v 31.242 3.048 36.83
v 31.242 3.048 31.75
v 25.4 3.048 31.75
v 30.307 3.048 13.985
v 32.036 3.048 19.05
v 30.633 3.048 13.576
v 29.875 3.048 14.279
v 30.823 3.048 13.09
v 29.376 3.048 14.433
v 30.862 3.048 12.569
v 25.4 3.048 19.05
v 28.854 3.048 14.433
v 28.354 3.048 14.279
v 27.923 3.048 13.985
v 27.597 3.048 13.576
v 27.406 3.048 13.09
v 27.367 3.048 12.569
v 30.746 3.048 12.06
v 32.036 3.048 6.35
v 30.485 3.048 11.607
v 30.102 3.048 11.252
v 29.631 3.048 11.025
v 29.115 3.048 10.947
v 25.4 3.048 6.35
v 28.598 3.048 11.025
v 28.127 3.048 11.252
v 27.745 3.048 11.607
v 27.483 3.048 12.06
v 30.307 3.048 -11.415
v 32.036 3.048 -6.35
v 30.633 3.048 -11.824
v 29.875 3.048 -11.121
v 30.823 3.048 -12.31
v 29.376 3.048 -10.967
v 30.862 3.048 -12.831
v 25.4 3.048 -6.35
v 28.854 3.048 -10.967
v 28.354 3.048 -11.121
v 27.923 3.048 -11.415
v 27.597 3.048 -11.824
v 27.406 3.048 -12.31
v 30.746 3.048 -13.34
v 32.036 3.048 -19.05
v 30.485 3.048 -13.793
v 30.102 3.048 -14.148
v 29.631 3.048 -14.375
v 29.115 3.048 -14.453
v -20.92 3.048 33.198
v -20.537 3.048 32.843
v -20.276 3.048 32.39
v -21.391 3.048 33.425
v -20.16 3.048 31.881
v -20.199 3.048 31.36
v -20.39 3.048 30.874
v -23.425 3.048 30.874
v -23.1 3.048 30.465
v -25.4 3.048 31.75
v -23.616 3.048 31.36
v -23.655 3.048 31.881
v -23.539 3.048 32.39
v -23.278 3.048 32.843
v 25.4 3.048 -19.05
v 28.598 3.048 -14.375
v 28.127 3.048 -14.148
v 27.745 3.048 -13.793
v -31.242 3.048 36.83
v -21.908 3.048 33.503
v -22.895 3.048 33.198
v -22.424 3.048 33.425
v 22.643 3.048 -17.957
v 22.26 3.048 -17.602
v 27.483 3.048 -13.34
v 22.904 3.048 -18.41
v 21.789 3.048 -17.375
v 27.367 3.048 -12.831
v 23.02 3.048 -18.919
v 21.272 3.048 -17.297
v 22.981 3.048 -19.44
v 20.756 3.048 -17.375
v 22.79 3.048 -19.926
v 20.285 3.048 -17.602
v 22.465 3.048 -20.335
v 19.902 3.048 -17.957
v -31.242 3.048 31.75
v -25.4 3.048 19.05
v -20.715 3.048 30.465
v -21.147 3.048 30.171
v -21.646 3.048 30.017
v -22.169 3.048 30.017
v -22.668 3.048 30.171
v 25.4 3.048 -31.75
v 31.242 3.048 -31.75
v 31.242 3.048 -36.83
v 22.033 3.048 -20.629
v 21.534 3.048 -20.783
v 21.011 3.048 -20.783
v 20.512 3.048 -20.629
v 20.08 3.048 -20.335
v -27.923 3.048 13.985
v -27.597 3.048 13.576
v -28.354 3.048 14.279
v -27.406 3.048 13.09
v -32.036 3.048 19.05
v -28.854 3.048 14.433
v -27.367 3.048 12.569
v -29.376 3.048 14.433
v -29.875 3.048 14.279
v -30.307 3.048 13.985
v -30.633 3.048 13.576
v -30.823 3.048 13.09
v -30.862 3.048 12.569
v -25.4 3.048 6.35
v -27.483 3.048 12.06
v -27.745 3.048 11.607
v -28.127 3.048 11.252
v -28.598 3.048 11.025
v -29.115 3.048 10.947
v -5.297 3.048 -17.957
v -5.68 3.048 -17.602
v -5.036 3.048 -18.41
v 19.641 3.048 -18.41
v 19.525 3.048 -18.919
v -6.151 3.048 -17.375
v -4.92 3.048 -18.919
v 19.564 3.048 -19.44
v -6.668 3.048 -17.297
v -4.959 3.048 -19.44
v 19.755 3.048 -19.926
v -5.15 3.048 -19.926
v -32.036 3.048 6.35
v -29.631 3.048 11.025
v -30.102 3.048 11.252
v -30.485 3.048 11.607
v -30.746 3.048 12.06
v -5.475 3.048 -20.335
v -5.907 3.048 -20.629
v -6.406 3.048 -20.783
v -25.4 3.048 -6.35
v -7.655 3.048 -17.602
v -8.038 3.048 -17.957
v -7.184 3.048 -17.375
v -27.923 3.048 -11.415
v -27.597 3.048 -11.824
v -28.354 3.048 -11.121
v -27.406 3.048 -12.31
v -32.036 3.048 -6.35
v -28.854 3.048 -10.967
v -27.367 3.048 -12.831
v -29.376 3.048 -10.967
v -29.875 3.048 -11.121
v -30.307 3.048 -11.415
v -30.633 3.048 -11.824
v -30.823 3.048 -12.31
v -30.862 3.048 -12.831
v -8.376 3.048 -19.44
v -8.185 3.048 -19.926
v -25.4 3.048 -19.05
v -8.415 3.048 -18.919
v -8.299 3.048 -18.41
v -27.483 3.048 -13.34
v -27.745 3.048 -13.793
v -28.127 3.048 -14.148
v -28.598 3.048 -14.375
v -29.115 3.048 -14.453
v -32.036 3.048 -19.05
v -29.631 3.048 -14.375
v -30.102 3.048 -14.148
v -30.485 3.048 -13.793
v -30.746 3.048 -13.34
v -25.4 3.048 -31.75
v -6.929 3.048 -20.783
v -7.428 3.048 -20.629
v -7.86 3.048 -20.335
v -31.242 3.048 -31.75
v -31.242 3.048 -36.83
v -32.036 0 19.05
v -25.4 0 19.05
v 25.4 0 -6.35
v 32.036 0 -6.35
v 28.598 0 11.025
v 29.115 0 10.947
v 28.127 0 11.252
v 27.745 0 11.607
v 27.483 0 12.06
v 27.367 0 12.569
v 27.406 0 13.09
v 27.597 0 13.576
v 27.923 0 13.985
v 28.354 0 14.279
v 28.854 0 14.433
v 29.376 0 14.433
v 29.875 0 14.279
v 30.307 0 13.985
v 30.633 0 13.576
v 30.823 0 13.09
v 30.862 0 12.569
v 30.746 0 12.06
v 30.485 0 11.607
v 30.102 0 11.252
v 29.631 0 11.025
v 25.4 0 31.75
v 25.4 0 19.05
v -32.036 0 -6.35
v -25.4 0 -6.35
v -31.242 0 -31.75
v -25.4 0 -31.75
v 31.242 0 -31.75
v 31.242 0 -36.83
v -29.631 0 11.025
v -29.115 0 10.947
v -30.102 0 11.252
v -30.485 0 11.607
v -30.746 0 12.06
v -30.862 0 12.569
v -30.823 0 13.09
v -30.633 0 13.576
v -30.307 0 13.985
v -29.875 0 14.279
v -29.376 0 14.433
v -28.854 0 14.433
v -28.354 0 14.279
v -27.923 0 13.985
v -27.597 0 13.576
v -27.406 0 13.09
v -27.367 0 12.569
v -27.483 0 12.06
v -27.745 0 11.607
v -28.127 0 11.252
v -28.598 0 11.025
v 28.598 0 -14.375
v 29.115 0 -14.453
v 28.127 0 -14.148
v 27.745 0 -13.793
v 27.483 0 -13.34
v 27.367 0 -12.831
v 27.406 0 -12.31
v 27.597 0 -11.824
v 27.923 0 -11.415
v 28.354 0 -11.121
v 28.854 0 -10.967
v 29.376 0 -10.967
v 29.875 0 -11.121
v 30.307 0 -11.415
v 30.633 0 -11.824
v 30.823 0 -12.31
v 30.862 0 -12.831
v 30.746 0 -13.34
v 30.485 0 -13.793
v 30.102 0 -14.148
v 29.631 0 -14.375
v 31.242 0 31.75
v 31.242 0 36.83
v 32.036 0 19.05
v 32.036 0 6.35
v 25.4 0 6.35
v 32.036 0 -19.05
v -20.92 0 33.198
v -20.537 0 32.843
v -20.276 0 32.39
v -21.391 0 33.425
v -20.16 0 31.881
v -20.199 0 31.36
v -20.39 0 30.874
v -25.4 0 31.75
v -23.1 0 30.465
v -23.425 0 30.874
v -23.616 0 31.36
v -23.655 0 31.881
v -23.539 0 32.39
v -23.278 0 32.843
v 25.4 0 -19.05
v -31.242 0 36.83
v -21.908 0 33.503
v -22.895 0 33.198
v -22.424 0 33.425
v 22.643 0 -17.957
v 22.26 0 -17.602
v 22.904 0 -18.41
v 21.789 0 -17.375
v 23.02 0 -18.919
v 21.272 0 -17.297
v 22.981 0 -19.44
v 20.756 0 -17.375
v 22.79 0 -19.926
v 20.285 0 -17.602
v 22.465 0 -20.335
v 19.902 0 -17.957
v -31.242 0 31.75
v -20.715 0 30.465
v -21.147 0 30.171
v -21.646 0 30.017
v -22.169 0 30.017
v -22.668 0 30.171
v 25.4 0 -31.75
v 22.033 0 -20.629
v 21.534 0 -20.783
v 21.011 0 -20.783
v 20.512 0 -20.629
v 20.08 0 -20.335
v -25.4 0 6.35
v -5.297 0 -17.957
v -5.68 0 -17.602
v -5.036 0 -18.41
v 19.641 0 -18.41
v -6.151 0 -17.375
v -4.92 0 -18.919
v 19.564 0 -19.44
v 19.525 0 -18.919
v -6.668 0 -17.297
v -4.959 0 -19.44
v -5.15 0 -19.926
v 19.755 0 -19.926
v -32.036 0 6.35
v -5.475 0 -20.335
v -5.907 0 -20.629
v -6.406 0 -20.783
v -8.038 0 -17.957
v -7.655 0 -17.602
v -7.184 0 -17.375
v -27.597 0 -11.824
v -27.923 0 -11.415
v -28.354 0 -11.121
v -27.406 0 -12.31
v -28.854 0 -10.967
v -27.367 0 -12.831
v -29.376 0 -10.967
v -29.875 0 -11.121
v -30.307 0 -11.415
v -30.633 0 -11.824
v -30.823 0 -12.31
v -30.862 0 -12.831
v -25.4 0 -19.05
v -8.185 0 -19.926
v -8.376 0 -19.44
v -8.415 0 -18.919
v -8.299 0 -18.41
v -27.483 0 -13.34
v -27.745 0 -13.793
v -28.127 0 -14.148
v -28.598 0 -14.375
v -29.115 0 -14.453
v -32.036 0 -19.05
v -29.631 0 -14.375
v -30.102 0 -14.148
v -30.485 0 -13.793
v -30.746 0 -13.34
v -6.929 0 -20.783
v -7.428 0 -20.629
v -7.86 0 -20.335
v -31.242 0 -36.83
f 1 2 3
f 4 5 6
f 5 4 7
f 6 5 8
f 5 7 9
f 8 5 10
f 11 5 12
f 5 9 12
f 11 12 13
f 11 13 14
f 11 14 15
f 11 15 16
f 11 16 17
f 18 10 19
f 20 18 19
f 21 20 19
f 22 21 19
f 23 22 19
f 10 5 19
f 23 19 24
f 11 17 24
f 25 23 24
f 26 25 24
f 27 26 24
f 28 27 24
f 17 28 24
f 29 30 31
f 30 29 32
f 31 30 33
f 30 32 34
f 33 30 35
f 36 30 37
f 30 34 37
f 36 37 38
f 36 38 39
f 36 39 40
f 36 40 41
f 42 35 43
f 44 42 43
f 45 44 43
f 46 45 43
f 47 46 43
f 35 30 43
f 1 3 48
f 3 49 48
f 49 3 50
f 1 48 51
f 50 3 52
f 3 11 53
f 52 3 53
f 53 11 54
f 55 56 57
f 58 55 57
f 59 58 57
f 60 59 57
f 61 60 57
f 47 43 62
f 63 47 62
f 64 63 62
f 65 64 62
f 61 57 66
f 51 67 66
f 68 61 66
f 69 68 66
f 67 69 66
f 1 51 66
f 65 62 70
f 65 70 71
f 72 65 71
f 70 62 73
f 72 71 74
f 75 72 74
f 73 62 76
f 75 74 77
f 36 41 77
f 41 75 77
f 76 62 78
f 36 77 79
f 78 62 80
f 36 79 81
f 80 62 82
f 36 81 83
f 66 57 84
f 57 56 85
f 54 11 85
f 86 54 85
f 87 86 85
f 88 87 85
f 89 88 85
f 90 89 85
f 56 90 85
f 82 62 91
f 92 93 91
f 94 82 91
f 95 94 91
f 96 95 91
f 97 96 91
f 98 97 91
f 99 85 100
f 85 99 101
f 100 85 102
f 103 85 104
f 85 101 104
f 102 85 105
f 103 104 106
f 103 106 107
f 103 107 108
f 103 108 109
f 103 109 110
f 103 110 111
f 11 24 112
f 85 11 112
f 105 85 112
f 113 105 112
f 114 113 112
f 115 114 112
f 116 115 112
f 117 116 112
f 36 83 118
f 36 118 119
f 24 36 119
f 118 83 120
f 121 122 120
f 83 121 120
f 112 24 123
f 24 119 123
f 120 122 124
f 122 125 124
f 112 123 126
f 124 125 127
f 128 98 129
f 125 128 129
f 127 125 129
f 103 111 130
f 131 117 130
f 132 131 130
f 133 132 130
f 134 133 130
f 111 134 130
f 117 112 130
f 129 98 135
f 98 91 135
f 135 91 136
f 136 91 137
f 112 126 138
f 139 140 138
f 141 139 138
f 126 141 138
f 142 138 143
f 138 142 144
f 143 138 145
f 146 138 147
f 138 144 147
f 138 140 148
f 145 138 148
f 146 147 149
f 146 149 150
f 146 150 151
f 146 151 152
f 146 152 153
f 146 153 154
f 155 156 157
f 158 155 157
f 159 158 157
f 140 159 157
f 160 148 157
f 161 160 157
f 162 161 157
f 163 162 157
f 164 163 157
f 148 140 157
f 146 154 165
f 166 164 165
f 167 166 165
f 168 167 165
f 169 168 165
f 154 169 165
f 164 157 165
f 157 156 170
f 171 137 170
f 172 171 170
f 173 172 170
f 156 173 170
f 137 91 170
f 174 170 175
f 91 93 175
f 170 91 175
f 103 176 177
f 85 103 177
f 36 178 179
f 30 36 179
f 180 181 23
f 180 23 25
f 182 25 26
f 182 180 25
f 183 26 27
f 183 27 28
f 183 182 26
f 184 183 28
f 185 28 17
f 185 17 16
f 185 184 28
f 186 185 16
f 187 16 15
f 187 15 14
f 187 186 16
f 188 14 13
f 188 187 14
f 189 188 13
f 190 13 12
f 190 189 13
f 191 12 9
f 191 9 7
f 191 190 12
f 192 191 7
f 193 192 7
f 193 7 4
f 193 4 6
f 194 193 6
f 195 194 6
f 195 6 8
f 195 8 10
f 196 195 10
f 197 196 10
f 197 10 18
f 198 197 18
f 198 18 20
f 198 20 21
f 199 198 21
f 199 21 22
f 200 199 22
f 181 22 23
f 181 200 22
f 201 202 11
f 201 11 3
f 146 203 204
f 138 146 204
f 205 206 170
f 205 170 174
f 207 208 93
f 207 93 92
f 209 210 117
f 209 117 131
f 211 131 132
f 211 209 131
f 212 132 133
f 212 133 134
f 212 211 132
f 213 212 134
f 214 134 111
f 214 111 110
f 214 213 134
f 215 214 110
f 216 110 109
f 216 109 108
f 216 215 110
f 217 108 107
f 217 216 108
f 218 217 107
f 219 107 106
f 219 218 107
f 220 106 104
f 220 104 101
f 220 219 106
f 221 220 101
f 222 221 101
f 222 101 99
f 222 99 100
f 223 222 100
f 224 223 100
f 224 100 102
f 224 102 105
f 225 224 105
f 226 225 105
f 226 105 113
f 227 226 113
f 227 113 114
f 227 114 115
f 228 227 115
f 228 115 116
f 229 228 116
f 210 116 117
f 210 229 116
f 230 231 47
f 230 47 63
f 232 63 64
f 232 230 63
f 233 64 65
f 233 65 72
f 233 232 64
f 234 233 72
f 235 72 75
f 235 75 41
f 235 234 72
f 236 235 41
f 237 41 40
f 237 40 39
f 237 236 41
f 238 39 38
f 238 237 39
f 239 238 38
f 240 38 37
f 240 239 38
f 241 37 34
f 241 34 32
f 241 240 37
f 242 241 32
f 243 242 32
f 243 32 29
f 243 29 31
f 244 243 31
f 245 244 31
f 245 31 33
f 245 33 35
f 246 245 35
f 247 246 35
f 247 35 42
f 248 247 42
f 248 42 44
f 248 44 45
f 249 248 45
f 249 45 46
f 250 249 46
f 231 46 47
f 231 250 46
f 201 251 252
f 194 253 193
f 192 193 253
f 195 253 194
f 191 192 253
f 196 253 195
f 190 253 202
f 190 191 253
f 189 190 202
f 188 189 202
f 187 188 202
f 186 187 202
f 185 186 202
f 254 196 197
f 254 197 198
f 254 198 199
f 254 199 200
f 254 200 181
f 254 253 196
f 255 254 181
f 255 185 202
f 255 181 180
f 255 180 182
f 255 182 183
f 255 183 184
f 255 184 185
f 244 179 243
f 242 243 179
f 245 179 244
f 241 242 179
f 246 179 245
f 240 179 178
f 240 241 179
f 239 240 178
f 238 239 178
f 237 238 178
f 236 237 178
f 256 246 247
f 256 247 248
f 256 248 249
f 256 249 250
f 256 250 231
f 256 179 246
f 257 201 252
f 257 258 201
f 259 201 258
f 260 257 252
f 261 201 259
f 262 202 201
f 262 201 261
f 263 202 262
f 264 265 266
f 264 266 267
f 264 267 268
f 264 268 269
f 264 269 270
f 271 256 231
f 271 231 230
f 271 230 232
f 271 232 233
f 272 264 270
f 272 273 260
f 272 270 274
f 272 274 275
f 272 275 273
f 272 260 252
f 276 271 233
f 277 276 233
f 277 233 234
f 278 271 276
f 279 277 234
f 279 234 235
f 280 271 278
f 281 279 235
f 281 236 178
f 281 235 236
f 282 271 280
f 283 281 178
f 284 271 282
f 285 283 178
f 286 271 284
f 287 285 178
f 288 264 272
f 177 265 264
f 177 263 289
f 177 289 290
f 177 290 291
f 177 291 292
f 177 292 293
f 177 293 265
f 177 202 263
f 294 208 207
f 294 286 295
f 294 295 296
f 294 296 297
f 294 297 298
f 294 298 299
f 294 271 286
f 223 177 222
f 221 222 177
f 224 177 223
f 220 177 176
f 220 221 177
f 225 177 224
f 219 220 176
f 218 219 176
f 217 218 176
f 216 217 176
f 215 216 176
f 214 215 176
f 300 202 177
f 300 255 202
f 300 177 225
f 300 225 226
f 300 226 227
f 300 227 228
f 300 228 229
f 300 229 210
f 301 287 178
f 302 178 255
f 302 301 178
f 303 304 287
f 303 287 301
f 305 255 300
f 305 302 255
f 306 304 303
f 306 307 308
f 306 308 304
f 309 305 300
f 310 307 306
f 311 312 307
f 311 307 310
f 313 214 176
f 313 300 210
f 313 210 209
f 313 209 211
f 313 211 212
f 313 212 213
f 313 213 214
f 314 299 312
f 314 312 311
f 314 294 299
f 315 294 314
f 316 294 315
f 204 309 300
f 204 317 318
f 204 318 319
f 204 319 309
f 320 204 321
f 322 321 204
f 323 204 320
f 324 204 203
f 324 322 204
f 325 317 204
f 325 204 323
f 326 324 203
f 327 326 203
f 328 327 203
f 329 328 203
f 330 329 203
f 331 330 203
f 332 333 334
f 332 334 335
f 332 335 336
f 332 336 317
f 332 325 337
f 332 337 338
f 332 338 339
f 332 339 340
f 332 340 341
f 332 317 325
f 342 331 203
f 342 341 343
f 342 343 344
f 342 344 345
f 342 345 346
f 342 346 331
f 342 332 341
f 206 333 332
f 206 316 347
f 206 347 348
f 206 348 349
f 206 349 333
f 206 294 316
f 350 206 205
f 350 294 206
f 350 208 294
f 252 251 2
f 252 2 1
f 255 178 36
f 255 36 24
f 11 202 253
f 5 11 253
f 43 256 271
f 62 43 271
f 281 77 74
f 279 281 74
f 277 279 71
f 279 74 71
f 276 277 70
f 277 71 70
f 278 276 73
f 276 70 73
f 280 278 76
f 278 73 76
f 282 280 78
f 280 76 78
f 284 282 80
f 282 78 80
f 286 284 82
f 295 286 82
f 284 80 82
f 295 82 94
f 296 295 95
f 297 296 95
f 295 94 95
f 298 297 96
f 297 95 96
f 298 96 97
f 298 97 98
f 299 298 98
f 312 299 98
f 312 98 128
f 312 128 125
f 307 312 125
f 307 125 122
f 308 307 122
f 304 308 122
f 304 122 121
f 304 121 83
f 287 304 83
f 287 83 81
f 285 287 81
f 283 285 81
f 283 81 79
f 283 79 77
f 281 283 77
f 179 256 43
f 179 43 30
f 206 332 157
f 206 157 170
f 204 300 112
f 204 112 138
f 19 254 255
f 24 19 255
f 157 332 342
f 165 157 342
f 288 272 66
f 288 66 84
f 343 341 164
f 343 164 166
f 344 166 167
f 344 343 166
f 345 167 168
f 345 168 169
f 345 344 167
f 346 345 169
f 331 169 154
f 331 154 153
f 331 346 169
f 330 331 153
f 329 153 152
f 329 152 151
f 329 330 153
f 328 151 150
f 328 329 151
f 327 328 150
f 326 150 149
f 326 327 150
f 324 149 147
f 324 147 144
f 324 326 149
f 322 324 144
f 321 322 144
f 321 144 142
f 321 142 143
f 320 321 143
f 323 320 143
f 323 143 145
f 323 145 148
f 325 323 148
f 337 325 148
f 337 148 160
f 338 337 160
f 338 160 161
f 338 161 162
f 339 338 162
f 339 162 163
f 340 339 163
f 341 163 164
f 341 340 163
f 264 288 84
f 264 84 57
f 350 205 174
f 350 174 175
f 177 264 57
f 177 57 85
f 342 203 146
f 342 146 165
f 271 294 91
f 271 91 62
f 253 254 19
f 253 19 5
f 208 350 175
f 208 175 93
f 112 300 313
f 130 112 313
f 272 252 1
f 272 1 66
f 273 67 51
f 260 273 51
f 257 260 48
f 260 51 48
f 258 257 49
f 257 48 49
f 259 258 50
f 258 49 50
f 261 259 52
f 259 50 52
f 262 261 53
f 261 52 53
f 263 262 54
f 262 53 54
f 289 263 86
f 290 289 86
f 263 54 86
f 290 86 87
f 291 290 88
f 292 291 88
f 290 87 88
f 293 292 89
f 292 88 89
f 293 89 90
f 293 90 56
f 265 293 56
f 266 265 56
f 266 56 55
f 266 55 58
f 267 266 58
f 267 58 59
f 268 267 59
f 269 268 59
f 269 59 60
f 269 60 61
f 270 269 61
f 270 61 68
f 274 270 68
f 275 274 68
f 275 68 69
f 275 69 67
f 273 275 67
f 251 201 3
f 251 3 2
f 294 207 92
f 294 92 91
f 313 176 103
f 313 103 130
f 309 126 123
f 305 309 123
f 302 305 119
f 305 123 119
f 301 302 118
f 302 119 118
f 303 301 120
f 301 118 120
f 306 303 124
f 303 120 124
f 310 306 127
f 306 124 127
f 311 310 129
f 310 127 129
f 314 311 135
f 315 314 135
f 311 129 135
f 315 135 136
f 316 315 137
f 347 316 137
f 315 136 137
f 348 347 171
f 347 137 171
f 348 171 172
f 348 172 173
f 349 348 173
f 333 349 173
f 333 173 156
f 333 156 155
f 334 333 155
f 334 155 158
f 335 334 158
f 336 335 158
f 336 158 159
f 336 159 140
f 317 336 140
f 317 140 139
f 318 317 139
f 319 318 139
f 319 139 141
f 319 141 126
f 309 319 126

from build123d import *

# Parameters (mm, degrees)
SKETCH1_R           = 1.7526
BOSS_EXTRUDE1_DEPTH = 3.048
SKETCH2_R           = 1.7526
CUT_EXTRUDE1_DEPTH  = 49.908368221


with BuildPart() as part:
    # Sketch1 → Boss-Extrude1 (new body)
    with BuildSketch(Plane(origin=(0, 0, 0), x_dir=(1, 0, 0), z_dir=(0, 1, 0))):
        Polygon((31.242, -36.83), (-31.242, -36.83), (-31.242, -31.75), (-25.4, -31.75), (-25.4, -19.05), (-31.242, -19.05), (-32.03575, -19.05), (-32.03575, -6.35), (-31.242, -6.35), (-25.4, -6.35), (-25.4, 6.35), (-31.242, 6.35), (-32.03575, 6.35), (-32.03575, 19.05), (-31.242, 19.05), (-25.4, 19.05), (-25.4, 31.75), (-31.242, 31.75), (-31.242, 36.83), (31.242, 36.83), (31.242, 31.75), (25.4, 31.75), (25.4, 19.05), (31.242, 19.05), (32.03575, 19.05), (32.03575, 6.35), (31.242, 6.35), (25.4, 6.35), (25.4, -6.35), (31.242, -6.35), (32.03575, -6.35), (32.03575, -19.05), (31.242, -19.05), (25.4, -19.05), (25.4, -31.75), (31.242, -31.75), align=None)
        with Locations(Location((-29.11475, 12.7, 0), (0, 0, 90))):
            Circle(SKETCH1_R, mode=Mode.SUBTRACT)
        with Locations(Location((-29.11475, -12.7, 0), (0, 0, 90))):
            Circle(SKETCH1_R, mode=Mode.SUBTRACT)
        with Locations(Location((29.11475, -12.7, 0), (0, 0, 90))):
            Circle(SKETCH1_R, mode=Mode.SUBTRACT)
        with Locations(Location((29.11475, 12.7, 0), (0, 0, 90))):
            Circle(SKETCH1_R, mode=Mode.SUBTRACT)
    extrude(amount=BOSS_EXTRUDE1_DEPTH)

    # Sketch2 → Cut-Extrude1 (cut, through all)
    with BuildSketch(Plane(origin=(0, 3.048, 0), x_dir=(1, 0, 0), z_dir=(0, 1, 0))):
        with Locations(Location((21.2725, 19.05, 0), (0, 0, 270))):
            Circle(SKETCH2_R)
        with Locations(Location((-6.6675, 19.05, 0), (0, 0, 270))):
            Circle(SKETCH2_R)
        with Locations(Location((-21.9075, -31.75, 0), (0, 0, 270))):
            Circle(SKETCH2_R)
    extrude(amount=-CUT_EXTRUDE1_DEPTH, mode=Mode.SUBTRACT)


solid = part.part
